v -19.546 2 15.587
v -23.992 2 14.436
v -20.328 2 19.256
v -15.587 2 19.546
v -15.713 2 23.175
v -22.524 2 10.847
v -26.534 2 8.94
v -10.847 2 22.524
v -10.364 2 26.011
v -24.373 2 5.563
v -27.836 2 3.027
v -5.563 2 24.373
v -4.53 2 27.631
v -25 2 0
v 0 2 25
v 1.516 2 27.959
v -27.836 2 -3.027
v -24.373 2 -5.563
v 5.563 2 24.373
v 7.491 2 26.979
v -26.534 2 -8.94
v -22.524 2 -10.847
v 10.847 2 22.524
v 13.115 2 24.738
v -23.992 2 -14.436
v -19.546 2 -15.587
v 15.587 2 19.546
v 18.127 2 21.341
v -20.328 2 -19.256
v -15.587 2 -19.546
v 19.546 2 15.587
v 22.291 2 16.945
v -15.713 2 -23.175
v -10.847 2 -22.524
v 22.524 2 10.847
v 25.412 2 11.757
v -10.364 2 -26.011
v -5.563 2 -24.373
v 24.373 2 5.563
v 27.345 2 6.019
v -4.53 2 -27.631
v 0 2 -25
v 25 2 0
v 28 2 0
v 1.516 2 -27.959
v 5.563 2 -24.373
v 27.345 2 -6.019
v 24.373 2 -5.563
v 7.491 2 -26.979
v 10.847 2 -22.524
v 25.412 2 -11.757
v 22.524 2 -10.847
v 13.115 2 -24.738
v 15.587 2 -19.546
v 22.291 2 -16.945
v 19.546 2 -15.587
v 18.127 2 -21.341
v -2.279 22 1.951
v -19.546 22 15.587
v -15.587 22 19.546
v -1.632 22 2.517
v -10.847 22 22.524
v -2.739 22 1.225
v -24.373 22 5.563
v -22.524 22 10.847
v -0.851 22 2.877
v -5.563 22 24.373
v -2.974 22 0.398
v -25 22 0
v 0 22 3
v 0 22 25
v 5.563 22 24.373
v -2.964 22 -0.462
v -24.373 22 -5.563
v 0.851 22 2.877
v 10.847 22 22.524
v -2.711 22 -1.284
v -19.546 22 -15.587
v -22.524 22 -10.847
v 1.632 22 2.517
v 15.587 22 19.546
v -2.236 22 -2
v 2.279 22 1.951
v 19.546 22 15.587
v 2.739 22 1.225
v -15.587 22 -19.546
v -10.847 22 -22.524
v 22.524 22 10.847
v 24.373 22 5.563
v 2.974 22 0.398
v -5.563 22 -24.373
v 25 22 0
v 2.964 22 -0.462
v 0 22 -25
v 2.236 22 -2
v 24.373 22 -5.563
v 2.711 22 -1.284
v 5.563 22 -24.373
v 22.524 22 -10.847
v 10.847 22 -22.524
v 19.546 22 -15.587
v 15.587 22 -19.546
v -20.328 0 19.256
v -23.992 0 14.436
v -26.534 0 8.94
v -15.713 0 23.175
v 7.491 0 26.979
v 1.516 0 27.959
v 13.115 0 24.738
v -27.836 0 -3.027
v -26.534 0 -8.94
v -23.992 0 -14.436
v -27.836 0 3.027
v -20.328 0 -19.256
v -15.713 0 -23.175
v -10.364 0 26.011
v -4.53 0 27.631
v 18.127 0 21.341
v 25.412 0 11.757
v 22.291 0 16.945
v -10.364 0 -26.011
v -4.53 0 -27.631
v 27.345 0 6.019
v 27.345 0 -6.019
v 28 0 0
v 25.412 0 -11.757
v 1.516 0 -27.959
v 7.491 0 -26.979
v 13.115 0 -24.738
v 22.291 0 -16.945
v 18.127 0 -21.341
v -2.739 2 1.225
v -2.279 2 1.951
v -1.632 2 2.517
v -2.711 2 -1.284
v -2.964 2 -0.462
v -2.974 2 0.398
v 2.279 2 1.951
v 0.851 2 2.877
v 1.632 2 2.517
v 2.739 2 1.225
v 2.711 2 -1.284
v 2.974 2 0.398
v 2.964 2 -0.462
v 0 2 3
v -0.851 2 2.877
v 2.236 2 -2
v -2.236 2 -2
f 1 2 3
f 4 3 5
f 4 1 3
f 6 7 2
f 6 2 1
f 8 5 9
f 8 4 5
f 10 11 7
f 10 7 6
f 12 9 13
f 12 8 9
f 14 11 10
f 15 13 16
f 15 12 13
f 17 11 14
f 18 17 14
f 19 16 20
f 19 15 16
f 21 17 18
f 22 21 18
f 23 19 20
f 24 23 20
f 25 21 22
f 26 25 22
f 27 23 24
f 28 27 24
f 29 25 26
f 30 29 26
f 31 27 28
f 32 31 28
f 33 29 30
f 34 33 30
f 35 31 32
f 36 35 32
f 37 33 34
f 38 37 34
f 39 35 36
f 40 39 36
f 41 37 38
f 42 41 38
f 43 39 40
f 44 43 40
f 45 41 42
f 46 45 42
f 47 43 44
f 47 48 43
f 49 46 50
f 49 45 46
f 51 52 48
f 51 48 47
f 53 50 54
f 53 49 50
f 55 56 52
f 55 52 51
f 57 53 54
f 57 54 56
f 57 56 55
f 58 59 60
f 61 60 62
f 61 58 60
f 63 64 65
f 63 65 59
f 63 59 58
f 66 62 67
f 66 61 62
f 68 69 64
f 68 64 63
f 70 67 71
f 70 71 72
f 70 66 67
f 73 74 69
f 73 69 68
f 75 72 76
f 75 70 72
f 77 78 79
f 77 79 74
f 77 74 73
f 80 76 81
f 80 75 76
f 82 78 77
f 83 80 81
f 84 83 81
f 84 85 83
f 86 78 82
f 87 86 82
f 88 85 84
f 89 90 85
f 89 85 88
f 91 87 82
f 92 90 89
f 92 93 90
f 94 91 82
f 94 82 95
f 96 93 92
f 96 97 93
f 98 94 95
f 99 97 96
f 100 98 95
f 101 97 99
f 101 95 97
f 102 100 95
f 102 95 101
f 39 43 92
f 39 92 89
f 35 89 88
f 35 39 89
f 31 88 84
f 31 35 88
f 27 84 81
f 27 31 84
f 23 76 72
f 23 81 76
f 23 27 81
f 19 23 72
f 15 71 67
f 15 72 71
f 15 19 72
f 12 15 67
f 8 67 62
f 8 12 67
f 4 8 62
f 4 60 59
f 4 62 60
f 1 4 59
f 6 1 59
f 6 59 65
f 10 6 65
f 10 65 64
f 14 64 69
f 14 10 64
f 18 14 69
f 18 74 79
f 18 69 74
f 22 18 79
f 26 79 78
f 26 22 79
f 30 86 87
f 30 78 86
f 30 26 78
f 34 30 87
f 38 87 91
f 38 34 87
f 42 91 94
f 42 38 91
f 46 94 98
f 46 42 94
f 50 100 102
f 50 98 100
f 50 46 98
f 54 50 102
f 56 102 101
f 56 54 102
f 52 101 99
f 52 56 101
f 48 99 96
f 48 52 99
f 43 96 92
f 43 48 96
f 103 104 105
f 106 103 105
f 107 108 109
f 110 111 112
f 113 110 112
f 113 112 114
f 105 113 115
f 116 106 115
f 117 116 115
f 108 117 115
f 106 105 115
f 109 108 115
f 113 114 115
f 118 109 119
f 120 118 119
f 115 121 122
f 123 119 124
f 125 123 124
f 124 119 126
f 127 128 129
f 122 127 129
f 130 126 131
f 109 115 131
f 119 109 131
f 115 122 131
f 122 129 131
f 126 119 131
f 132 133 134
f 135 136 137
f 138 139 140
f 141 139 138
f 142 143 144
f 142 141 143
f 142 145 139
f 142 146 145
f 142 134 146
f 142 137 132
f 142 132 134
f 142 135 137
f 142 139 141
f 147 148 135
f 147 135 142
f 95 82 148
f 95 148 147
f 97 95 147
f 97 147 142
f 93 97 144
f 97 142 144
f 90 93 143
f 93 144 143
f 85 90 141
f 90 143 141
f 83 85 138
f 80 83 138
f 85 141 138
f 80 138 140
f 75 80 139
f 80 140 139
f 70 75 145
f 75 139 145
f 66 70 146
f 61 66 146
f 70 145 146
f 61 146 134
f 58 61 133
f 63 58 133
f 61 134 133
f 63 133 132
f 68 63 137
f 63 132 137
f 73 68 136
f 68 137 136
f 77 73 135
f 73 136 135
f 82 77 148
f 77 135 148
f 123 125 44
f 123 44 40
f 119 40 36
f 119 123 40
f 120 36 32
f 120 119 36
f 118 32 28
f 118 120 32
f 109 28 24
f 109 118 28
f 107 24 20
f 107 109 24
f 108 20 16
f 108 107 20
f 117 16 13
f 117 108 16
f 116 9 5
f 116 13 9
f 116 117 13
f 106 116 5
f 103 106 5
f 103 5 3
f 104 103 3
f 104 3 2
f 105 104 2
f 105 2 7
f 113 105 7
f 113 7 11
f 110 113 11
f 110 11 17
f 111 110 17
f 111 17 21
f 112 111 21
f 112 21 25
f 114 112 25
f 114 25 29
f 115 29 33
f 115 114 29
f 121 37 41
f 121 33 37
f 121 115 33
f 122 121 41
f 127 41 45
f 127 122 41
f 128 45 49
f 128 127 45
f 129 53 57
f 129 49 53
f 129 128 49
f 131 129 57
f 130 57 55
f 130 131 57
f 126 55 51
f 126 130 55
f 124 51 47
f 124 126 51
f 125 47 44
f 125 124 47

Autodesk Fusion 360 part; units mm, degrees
sketch "스케치1" plane through (0, 0, 0) normal (0, 1, 0) x (1, 0, 0)
  circle A0 centre (0, 0) radius 3
  line L0 (-3, 2) -> (3, 2)
  line L1 (3, 2) -> (3, -3)
  line L2 (3, -3) -> (-3, -3)
  line L3 (-3, -3) -> (-3, 2)
  circle A1 centre (0, 0) radius 25
  dimension "d1" = 6
  dimension "d2" = 5
  dimension "d3" = 50
extrude "돌출1" add sketch "스케치1" along normal blind 22 contours A0 L1 L2 | A0 L0 L1 | A0 L0 | A0 L2 L3 | A0 L0 L3 | A1 picked at (-0.1397, 2.3235)
sketch "스케치2" plane through (0, 0, 0) normal (0, 1, 0) x (1, 0, 0)
  circle A0 centre (0, 0) radius 28
  dimension "d6" = 56
extrude "돌출2" add sketch "스케치2" along normal blind 2
